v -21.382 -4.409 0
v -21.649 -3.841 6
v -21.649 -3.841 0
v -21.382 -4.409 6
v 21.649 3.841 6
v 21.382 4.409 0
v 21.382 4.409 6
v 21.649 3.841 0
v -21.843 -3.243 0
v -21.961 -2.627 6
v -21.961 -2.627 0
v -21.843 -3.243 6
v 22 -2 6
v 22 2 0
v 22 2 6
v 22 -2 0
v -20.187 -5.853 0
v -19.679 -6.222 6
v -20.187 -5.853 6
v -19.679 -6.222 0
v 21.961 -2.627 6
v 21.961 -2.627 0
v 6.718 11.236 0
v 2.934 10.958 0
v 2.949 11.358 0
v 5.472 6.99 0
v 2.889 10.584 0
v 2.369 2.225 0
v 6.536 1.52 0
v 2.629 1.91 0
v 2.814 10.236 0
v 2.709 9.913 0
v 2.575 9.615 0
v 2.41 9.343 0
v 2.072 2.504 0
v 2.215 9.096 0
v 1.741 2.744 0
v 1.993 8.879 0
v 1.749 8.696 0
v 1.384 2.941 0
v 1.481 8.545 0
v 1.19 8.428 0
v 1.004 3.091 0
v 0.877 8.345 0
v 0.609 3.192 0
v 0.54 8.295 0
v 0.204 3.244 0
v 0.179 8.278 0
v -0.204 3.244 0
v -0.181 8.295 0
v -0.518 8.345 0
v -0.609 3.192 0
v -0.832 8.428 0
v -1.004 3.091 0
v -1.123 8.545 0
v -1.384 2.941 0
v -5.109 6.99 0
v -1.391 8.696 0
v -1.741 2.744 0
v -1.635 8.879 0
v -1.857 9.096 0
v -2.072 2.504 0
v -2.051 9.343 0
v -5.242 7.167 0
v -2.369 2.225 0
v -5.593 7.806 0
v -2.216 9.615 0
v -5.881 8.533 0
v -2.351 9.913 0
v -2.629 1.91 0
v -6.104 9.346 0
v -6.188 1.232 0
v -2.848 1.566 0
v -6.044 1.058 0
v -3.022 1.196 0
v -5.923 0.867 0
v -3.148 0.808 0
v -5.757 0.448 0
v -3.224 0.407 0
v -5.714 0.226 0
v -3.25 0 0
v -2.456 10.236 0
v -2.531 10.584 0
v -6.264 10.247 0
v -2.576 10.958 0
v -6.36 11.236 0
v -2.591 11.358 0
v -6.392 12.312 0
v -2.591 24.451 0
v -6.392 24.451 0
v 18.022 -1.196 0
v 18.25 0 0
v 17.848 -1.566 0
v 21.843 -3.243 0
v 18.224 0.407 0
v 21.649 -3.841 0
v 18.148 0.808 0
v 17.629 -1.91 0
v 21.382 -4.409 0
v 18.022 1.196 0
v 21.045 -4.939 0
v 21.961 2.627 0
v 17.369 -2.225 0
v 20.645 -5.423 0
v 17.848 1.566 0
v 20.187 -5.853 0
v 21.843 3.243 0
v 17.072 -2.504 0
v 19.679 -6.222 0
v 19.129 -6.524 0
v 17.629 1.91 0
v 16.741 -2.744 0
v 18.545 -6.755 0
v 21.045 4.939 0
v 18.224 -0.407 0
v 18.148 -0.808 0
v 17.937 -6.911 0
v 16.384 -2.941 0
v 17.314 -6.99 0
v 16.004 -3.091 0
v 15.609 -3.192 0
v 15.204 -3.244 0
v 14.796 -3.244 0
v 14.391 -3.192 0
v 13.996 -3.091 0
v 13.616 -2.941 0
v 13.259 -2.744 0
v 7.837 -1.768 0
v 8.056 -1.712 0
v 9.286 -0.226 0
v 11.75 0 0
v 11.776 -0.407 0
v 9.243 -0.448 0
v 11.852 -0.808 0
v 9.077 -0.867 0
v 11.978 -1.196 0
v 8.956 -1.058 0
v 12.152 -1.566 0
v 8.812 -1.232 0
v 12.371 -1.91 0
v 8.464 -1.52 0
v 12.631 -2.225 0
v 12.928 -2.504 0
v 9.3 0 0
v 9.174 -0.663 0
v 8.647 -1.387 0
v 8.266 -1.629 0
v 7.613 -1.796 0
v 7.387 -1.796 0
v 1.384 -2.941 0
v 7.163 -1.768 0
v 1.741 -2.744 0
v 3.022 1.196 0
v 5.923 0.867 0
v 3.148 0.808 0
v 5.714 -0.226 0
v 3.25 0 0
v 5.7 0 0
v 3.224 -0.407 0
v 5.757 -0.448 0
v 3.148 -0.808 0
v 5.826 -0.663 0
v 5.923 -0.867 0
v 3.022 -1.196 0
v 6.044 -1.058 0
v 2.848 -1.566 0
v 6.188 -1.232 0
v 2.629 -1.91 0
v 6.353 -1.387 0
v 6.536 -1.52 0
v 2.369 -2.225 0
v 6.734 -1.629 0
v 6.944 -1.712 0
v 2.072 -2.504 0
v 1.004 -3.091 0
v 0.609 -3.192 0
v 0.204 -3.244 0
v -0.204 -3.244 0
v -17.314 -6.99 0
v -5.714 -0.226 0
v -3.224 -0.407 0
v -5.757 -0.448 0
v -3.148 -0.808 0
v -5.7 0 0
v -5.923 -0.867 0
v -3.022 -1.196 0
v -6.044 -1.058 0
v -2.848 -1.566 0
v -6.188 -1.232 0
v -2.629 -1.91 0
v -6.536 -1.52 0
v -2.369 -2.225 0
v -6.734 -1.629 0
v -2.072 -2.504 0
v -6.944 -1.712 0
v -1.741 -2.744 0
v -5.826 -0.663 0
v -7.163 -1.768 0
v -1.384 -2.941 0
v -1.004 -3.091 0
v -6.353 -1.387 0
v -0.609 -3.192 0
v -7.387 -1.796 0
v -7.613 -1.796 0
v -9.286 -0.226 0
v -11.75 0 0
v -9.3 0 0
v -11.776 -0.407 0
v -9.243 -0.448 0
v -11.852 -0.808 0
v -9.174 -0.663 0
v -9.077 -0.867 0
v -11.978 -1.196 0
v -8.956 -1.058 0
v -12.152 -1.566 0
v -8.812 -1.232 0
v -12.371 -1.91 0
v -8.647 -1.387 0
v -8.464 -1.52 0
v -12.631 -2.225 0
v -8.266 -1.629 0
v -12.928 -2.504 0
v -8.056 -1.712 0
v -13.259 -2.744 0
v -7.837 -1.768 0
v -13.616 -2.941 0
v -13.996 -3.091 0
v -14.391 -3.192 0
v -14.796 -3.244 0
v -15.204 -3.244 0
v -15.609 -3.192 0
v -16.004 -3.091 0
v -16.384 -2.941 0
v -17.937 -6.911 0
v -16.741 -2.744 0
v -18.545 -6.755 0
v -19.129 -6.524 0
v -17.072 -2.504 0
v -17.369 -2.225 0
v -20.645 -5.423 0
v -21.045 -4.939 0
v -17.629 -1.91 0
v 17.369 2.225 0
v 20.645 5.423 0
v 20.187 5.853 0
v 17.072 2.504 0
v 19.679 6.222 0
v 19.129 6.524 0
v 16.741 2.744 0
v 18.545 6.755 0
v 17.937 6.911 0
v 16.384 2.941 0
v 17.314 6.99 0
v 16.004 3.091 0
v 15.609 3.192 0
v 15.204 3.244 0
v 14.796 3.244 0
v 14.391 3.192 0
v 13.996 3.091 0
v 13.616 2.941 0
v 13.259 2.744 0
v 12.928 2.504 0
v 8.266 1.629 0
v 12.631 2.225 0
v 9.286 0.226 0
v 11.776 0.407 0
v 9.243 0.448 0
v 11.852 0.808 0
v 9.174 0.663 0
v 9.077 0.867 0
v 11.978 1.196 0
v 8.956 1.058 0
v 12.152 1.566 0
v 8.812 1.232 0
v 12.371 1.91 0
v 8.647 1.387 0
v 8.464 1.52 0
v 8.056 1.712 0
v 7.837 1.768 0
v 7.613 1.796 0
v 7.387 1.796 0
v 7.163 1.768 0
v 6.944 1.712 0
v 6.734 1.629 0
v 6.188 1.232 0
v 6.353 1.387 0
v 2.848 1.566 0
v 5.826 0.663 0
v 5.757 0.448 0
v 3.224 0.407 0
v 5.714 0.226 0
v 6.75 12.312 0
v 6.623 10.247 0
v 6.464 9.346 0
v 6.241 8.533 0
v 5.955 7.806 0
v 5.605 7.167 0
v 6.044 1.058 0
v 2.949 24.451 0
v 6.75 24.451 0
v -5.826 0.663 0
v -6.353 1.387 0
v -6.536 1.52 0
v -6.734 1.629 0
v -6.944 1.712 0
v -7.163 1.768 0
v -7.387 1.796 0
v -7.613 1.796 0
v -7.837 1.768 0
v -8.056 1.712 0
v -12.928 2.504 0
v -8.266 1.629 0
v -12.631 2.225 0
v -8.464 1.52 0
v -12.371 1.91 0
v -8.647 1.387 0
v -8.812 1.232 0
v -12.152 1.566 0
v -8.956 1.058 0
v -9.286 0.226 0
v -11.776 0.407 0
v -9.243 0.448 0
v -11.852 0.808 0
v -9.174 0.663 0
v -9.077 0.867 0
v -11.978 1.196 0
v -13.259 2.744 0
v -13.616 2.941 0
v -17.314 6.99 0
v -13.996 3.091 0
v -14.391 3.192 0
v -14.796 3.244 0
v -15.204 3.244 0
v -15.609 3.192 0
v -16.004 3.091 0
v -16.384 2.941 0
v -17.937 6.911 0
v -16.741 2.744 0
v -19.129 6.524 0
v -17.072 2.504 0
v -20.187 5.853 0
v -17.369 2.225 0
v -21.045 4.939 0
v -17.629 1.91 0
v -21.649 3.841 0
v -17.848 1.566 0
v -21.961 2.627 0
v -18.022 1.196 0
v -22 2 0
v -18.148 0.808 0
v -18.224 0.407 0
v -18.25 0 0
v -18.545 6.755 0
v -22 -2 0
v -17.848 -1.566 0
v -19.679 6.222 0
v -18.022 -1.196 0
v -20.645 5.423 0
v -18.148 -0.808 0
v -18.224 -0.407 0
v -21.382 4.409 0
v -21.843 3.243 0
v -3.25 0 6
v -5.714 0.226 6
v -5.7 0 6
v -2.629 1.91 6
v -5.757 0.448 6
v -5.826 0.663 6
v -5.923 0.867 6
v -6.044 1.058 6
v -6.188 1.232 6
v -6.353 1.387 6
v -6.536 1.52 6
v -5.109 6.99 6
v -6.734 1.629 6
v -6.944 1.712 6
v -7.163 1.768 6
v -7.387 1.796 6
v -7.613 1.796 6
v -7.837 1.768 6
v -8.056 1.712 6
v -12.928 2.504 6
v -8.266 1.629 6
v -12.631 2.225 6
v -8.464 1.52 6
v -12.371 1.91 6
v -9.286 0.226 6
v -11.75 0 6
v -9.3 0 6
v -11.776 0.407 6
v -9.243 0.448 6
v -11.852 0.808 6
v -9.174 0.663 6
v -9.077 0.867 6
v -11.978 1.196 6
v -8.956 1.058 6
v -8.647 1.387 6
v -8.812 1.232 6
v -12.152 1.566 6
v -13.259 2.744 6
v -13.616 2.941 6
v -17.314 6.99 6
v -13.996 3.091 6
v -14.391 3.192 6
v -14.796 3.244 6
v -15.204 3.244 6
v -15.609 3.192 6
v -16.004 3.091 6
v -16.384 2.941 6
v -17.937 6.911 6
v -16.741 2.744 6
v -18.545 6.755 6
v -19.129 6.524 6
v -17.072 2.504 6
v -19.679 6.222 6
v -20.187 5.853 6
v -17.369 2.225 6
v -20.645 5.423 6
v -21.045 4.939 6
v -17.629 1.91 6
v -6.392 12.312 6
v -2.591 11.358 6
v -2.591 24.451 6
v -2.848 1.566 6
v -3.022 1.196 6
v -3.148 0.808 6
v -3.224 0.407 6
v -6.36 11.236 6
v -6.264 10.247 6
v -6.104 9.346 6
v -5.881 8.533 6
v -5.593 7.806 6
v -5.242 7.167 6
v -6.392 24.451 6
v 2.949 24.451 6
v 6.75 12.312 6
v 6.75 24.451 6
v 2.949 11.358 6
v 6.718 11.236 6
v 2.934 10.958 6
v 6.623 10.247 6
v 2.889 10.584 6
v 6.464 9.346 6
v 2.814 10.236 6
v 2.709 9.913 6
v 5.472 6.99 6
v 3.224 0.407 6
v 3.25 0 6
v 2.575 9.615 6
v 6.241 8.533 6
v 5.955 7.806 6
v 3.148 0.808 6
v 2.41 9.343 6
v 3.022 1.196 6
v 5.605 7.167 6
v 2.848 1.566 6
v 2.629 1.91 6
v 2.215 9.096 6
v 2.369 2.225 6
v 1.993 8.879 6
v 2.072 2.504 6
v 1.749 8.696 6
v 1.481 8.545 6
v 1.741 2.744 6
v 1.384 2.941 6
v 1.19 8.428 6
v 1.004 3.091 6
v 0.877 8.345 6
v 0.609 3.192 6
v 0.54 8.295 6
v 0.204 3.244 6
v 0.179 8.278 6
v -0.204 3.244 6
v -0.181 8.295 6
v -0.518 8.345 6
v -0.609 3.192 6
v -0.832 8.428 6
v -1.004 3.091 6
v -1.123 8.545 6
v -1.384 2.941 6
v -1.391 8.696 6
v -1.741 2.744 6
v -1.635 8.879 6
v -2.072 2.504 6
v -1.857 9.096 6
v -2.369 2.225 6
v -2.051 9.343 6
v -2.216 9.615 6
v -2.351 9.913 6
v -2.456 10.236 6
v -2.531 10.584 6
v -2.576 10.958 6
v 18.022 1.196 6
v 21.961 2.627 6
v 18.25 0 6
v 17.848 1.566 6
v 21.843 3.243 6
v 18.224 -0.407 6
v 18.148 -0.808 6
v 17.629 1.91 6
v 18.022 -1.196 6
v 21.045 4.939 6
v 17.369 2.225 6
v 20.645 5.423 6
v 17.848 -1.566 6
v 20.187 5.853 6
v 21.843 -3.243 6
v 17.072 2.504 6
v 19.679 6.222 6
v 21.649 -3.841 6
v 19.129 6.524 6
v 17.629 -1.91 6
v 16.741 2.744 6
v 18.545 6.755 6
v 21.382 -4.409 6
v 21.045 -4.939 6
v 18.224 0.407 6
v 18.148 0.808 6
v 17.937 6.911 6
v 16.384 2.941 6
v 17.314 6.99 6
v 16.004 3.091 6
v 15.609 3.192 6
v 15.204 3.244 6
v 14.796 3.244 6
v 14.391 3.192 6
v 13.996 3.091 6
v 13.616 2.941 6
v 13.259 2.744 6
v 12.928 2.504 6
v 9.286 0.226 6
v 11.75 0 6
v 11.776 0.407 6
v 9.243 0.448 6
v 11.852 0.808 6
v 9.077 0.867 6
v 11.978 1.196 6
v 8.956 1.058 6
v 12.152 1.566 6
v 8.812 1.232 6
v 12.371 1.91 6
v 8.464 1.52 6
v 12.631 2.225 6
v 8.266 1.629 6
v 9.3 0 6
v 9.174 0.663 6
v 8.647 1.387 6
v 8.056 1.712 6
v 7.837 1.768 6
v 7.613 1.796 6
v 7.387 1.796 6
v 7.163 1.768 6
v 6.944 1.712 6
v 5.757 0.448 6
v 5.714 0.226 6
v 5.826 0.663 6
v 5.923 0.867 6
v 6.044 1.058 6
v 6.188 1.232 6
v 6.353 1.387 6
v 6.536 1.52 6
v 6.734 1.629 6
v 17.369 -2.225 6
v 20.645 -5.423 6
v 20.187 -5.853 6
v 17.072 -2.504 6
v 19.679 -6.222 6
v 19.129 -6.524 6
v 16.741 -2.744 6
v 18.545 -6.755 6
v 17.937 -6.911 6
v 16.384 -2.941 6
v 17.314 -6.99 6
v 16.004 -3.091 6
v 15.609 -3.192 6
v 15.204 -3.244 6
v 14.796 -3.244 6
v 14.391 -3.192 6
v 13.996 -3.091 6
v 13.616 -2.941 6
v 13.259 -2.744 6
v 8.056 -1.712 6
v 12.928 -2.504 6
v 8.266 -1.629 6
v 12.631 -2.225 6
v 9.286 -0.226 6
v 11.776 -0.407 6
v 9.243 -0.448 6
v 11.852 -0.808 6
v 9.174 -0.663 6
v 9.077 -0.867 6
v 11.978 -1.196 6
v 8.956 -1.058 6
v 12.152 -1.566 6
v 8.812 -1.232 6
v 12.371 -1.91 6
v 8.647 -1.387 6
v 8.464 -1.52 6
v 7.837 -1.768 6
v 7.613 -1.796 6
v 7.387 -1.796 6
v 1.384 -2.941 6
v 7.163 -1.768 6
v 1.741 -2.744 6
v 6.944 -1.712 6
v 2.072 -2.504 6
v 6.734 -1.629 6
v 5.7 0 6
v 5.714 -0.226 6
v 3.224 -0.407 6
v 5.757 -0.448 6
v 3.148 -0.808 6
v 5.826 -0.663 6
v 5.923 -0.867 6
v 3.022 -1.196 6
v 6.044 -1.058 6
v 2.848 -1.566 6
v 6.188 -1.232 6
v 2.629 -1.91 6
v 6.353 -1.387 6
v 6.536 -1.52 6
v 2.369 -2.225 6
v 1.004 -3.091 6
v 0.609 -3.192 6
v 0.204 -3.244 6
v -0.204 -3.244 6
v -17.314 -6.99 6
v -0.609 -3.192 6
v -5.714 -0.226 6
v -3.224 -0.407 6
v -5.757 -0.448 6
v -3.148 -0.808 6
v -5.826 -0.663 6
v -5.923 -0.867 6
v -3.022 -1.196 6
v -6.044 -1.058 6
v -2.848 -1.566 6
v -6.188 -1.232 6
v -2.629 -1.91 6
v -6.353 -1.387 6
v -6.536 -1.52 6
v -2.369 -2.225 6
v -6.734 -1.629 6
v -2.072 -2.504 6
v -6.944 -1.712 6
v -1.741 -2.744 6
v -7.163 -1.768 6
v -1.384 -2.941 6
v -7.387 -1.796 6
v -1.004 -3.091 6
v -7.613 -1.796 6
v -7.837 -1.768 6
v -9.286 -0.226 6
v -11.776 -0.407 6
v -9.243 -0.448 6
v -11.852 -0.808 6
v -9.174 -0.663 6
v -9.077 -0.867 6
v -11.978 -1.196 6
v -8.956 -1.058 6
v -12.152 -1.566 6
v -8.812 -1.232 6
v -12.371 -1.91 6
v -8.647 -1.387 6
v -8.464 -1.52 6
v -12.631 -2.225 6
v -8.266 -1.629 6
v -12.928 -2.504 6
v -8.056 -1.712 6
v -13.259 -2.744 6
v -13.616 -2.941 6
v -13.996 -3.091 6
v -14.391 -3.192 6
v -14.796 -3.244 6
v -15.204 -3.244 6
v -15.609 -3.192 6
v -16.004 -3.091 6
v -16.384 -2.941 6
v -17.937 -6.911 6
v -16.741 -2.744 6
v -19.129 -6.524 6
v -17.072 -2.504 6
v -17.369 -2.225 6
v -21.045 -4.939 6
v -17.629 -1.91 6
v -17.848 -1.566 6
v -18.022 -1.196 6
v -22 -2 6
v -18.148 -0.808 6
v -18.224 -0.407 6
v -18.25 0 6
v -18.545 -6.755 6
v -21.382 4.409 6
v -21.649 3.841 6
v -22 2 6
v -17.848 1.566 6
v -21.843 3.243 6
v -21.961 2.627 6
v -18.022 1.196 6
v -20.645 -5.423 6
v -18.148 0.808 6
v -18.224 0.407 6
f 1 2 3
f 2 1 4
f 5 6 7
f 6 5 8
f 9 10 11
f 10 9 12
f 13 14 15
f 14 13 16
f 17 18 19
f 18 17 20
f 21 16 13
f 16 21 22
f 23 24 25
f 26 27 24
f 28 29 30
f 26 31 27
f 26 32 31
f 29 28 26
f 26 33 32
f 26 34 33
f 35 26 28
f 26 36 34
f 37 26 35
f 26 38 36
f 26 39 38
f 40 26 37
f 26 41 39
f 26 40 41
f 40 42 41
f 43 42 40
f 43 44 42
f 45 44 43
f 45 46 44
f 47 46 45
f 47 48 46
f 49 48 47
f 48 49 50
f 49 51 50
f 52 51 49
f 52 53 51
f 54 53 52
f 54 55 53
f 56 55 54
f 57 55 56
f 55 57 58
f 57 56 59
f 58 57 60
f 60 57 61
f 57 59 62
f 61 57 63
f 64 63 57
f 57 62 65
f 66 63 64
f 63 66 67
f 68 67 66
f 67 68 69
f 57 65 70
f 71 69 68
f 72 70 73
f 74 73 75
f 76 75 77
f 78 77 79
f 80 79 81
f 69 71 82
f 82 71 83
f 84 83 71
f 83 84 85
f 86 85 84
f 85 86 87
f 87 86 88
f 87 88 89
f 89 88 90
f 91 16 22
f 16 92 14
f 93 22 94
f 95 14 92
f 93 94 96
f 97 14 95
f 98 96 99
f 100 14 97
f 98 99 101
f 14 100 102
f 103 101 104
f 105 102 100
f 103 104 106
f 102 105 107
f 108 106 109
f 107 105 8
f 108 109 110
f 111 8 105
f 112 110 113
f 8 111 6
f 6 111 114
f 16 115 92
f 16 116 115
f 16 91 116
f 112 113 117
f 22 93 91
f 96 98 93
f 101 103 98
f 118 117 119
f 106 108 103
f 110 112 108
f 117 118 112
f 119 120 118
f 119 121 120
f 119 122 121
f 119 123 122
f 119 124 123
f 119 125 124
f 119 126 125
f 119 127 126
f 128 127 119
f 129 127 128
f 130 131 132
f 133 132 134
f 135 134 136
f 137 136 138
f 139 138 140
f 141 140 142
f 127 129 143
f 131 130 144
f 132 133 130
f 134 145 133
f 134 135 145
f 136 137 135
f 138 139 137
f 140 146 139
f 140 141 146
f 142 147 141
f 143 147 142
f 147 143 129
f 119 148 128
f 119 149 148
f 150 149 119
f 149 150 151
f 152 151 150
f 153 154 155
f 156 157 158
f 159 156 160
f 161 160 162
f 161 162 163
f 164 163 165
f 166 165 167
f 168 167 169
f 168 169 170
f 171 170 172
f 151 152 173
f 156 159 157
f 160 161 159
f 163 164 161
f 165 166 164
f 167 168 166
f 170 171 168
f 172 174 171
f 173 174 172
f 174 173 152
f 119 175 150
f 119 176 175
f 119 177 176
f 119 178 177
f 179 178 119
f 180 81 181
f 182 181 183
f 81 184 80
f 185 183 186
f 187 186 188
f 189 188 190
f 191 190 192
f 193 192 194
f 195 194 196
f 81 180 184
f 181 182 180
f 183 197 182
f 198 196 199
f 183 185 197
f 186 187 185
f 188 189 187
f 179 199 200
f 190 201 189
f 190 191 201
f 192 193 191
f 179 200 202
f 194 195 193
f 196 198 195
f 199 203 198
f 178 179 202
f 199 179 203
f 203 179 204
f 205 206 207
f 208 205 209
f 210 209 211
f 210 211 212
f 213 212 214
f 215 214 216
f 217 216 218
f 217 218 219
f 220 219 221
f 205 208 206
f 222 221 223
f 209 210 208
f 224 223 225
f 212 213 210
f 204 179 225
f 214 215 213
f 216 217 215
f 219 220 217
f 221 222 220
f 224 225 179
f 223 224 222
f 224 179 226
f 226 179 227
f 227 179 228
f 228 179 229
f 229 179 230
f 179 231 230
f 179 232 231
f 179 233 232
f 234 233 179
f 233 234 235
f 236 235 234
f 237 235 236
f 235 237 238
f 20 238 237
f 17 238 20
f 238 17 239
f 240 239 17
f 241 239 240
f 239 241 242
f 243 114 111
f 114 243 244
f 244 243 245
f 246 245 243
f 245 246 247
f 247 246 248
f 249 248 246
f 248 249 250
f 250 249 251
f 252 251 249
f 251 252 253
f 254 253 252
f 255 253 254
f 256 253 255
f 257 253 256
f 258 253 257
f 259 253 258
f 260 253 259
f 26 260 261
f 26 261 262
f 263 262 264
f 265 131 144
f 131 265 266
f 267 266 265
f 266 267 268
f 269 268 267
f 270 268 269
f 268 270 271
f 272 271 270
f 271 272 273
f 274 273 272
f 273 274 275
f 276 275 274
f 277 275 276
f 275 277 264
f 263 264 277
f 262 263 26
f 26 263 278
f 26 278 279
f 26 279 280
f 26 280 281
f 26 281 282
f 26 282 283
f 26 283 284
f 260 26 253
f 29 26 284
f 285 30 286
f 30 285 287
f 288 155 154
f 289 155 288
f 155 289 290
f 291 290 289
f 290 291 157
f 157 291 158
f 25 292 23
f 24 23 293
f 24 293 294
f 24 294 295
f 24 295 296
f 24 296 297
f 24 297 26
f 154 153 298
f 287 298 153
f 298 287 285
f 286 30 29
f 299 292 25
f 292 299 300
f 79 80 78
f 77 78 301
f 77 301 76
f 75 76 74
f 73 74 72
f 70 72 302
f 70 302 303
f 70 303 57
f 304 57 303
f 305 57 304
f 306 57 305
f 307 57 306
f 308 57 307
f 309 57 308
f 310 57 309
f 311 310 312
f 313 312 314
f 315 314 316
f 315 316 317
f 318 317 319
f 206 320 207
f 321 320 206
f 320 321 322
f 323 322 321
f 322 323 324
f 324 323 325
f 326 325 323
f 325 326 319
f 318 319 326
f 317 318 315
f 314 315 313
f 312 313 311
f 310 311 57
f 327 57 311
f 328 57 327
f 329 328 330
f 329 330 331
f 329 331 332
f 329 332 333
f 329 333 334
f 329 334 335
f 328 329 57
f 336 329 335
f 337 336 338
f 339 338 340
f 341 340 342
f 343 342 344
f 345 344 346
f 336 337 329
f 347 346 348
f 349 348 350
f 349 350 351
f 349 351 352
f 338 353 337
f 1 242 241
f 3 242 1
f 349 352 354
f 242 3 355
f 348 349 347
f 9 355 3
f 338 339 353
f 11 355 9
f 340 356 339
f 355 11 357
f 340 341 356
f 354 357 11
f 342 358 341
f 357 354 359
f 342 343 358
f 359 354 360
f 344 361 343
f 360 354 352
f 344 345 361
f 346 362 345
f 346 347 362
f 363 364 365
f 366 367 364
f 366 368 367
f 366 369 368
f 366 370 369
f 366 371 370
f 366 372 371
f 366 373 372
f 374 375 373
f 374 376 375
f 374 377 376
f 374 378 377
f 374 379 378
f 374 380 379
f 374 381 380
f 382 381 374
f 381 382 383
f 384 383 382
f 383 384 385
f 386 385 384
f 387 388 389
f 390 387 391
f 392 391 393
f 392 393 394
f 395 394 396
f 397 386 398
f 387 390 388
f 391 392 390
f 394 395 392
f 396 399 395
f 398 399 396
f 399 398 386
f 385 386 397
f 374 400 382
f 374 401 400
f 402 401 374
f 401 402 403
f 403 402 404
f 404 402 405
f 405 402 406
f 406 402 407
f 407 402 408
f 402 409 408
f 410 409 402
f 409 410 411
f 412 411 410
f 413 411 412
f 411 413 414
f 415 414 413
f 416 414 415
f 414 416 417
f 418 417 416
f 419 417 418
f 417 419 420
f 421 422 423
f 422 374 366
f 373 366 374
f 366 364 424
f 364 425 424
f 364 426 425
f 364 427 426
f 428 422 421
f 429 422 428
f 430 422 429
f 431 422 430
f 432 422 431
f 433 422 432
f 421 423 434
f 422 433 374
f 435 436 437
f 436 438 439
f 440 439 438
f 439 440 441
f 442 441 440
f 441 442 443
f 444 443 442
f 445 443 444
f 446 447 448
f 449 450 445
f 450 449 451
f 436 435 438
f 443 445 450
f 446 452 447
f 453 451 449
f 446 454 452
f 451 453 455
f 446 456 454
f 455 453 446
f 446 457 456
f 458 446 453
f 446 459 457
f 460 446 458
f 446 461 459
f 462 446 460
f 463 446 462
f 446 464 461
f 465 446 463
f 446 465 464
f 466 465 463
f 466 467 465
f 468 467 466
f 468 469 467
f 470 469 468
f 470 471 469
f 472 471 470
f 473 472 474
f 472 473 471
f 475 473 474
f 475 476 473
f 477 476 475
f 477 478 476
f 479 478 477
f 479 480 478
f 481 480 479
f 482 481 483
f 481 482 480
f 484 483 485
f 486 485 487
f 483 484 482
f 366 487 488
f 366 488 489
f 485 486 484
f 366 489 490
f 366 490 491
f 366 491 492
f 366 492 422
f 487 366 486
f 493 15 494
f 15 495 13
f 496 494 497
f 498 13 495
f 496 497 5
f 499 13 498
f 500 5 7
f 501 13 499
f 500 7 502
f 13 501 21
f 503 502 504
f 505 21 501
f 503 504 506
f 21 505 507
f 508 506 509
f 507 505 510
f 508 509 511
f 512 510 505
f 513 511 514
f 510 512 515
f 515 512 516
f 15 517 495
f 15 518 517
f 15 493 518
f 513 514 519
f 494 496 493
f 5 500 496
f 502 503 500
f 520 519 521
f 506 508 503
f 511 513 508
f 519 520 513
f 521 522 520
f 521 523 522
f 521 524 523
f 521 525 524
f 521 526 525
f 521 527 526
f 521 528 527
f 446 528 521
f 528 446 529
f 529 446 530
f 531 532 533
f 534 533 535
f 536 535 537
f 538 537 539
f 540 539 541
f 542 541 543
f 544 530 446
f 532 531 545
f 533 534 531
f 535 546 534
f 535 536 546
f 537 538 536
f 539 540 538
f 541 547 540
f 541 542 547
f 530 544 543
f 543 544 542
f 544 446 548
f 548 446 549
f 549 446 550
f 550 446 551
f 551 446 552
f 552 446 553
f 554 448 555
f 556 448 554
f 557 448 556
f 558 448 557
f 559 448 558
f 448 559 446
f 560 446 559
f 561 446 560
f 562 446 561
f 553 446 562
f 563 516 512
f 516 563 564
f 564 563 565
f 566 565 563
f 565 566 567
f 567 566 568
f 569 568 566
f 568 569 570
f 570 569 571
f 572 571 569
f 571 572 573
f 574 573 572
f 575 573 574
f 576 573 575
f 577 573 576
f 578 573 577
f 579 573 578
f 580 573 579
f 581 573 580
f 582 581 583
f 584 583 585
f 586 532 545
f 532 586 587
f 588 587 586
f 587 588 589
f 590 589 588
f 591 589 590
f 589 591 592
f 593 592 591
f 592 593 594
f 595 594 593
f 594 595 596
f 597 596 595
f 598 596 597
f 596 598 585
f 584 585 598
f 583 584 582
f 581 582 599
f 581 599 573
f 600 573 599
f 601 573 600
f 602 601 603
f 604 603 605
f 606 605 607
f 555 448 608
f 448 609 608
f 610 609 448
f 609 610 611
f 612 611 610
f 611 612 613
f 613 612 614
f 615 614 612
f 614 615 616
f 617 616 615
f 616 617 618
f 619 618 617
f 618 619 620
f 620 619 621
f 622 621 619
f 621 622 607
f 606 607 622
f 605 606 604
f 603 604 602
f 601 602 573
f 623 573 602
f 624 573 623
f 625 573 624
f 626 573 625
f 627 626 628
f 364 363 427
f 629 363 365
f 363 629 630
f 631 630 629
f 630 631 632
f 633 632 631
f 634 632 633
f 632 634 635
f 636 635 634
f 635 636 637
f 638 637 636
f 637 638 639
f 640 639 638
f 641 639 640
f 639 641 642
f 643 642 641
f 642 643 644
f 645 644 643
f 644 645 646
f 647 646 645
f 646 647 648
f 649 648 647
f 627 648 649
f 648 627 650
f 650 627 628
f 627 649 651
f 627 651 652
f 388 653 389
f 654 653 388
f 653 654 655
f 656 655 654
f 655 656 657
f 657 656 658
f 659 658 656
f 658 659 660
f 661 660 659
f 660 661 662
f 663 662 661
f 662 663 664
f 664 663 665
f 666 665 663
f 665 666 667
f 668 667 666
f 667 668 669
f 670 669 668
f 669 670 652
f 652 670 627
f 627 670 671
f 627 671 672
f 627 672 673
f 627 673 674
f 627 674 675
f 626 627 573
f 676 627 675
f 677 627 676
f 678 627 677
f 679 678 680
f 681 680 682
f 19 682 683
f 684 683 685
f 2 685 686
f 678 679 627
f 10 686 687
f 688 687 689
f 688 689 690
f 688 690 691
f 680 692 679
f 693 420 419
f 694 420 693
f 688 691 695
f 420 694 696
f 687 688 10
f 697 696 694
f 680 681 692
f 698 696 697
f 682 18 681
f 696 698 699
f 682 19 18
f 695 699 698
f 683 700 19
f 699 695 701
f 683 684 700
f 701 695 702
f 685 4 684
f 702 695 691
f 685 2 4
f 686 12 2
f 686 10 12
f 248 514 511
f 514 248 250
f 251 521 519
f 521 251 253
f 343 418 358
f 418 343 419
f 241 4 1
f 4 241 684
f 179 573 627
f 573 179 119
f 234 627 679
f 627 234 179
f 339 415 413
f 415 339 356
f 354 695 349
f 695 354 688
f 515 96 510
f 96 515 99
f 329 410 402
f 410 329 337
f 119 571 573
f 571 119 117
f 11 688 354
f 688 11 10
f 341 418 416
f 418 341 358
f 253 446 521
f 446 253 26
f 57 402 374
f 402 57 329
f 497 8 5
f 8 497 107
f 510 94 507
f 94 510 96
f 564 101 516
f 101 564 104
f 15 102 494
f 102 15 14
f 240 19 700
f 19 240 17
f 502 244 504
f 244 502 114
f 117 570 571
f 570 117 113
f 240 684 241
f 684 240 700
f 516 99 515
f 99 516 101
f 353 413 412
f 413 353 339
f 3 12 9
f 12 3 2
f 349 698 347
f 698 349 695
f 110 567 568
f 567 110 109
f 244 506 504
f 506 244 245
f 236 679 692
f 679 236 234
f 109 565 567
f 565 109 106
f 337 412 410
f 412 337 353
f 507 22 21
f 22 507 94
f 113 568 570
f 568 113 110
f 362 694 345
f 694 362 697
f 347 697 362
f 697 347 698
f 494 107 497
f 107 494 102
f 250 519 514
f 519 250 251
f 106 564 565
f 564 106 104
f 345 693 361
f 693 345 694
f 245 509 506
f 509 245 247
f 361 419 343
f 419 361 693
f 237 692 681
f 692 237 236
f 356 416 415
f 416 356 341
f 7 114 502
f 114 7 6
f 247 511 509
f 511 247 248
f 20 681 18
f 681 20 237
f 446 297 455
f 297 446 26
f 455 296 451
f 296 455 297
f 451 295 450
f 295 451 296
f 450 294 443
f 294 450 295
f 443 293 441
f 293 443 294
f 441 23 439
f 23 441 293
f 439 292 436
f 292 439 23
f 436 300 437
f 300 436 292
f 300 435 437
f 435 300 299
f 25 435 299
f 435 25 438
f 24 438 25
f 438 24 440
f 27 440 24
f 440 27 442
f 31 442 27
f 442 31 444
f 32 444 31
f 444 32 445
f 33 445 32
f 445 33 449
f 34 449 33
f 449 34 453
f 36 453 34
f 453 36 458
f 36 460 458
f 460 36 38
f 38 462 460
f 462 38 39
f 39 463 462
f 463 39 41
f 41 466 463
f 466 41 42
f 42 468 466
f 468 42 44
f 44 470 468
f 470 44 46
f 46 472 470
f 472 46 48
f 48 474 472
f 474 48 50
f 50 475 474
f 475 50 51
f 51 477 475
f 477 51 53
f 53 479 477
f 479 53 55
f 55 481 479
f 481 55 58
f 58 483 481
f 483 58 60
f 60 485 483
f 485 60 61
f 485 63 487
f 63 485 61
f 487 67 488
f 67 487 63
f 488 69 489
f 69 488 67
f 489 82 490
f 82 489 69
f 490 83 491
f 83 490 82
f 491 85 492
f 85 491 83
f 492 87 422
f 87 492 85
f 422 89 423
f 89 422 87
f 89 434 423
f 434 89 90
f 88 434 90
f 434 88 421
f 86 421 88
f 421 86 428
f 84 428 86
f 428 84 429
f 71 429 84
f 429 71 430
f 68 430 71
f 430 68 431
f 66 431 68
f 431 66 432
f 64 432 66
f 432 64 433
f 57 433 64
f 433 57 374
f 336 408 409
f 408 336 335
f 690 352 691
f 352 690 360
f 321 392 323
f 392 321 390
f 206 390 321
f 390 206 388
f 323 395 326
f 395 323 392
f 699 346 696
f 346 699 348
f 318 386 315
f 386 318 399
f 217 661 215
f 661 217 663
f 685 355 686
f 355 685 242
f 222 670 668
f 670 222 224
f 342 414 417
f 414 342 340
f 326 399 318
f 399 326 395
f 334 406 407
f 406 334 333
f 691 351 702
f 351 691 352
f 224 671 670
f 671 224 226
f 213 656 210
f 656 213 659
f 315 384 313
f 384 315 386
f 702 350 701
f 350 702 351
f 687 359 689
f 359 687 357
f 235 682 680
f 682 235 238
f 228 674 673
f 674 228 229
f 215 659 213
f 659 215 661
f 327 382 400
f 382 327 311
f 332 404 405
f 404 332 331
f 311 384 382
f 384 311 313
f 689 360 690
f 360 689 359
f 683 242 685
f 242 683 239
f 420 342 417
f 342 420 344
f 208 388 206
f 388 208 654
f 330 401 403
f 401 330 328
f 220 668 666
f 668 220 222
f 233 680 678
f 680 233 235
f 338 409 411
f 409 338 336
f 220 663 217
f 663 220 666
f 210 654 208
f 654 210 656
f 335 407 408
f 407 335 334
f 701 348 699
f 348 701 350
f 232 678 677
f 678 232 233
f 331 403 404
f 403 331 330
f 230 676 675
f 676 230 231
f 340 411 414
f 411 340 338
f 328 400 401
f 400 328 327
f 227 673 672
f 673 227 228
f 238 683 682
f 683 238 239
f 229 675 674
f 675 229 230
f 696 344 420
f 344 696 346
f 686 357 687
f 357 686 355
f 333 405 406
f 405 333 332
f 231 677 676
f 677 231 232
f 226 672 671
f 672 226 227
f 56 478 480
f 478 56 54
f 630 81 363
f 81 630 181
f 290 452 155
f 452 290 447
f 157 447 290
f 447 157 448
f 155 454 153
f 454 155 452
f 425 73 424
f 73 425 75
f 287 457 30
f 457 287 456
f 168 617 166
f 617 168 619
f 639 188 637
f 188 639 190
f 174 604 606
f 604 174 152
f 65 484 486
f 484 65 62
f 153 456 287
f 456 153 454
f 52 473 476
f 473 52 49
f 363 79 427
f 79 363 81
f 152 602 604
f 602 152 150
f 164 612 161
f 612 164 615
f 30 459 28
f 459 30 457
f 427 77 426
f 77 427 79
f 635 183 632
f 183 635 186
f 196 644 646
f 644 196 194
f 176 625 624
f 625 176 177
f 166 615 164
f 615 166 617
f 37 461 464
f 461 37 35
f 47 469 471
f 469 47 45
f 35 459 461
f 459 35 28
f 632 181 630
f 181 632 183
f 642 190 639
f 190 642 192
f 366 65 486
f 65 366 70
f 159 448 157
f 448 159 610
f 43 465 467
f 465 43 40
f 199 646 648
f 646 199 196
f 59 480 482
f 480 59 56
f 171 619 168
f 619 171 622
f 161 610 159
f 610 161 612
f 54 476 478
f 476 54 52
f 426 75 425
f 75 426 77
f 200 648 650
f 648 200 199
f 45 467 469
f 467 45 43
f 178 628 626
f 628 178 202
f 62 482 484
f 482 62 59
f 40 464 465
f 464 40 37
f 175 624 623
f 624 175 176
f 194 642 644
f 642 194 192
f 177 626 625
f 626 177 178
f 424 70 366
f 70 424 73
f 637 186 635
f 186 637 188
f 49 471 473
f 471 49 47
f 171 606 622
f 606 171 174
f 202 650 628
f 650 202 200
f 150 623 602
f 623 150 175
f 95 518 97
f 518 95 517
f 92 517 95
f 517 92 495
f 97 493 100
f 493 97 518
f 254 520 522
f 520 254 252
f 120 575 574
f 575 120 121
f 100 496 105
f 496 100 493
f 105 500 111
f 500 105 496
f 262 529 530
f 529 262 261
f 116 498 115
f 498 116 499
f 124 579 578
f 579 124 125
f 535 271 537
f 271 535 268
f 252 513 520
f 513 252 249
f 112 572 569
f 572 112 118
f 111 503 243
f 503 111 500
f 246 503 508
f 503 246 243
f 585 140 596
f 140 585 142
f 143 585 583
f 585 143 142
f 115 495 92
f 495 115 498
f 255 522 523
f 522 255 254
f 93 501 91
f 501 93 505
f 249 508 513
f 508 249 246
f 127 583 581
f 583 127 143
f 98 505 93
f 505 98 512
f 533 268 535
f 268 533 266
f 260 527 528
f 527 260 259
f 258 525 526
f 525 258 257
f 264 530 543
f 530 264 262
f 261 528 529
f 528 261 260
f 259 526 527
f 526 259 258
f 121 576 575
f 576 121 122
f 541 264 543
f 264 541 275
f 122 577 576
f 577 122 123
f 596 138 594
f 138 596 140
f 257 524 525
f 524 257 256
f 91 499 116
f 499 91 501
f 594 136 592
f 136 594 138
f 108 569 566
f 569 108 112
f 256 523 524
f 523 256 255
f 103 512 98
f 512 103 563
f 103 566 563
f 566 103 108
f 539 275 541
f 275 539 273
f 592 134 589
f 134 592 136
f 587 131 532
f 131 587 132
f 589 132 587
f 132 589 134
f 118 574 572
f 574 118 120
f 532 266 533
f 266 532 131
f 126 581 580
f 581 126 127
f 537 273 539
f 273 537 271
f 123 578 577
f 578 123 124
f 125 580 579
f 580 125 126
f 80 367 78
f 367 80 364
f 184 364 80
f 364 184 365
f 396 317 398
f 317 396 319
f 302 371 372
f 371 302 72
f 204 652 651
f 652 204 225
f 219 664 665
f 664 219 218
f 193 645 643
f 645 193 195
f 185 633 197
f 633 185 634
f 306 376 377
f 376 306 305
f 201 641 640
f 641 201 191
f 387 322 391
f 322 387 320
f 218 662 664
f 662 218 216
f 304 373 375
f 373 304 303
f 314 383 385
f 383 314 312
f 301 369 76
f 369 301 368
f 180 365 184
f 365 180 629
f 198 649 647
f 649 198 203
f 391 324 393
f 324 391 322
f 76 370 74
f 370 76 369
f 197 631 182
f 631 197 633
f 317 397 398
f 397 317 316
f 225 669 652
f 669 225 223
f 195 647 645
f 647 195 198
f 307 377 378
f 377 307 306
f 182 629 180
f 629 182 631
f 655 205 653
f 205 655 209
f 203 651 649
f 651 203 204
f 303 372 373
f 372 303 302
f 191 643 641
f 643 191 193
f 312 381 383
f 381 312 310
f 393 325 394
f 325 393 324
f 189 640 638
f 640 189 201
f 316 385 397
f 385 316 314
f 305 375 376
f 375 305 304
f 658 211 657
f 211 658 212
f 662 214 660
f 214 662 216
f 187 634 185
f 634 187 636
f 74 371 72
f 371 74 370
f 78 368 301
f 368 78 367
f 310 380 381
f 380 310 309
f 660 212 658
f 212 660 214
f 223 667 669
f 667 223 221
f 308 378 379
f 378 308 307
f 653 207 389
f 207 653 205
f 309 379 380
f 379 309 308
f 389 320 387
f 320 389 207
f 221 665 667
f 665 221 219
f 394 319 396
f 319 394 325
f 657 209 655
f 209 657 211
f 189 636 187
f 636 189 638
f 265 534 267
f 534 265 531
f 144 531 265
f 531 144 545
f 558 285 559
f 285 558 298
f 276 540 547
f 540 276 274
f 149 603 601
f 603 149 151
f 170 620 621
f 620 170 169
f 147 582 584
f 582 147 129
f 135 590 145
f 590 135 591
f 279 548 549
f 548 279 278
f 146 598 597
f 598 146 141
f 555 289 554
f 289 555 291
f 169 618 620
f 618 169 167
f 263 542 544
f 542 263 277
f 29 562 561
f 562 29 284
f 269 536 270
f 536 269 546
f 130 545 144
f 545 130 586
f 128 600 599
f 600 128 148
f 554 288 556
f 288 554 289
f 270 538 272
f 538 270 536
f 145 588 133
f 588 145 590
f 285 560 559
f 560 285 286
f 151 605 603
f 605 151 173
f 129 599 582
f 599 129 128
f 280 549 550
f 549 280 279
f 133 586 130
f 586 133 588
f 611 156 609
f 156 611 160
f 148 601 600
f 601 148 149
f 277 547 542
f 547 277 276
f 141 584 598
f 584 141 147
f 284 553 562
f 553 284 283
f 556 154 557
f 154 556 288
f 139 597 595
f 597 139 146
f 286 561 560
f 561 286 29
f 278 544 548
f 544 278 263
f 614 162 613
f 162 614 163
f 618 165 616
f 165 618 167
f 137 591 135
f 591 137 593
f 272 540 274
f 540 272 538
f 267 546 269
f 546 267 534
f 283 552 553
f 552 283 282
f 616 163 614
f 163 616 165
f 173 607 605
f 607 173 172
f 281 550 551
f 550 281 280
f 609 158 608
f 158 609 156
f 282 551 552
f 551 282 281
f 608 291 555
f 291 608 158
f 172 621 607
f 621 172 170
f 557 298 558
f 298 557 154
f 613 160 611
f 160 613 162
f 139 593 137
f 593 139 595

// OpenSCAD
$fn = 50;


difference() {
	union() {
		hull() {
			translate(v = [-17.0000000000, 2.0000000000, 0]) {
				cylinder(h = 6, r = 5);
			}
			translate(v = [17.0000000000, 2.0000000000, 0]) {
				cylinder(h = 6, r = 5);
			}
			translate(v = [-17.0000000000, -2.0000000000, 0]) {
				cylinder(h = 6, r = 5);
			}
			translate(v = [17.0000000000, -2.0000000000, 0]) {
				cylinder(h = 6, r = 5);
			}
		}
		translate(v = [0, 24, 0]) {
			linear_extrude(height = 6) {
				text(font = "DejaVu Sans Mono:style=Bold", halign = "center", size = 19.0000000000, text = "U", valign = "top");
			}
		}
	}
	union() {
		translate(v = [-15.0000000000, 0.0000000000, 0]) {
			translate(v = [0, 0, -100]) {
				cylinder(h = 200, r = 3.2500000000);
			}
		}
		translate(v = [0, 0, -100]) {
			cylinder(h = 200, r = 3.2500000000);
		}
		translate(v = [15.0000000000, 0.0000000000, 0]) {
			translate(v = [0, 0, -100]) {
				cylinder(h = 200, r = 3.2500000000);
			}
		}
		translate(v = [-15.0000000000, 0.0000000000, 0]) {
			translate(v = [0, 0, -100]) {
				cylinder(h = 200, r = 1.8000000000);
			}
		}
		translate(v = [-7.5000000000, 0.0000000000, 0]) {
			translate(v = [0, 0, -100]) {
				cylinder(h = 200, r = 1.8000000000);
			}
		}
		translate(v = [0, 0, -100]) {
			cylinder(h = 200, r = 1.8000000000);
		}
		translate(v = [7.5000000000, 0.0000000000, 0]) {
			translate(v = [0, 0, -100]) {
				cylinder(h = 200, r = 1.8000000000);
			}
		}
		translate(v = [15.0000000000, 0.0000000000, 0]) {
			translate(v = [0, 0, -100]) {
				cylinder(h = 200, r = 1.8000000000);
			}
		}
	}
}
